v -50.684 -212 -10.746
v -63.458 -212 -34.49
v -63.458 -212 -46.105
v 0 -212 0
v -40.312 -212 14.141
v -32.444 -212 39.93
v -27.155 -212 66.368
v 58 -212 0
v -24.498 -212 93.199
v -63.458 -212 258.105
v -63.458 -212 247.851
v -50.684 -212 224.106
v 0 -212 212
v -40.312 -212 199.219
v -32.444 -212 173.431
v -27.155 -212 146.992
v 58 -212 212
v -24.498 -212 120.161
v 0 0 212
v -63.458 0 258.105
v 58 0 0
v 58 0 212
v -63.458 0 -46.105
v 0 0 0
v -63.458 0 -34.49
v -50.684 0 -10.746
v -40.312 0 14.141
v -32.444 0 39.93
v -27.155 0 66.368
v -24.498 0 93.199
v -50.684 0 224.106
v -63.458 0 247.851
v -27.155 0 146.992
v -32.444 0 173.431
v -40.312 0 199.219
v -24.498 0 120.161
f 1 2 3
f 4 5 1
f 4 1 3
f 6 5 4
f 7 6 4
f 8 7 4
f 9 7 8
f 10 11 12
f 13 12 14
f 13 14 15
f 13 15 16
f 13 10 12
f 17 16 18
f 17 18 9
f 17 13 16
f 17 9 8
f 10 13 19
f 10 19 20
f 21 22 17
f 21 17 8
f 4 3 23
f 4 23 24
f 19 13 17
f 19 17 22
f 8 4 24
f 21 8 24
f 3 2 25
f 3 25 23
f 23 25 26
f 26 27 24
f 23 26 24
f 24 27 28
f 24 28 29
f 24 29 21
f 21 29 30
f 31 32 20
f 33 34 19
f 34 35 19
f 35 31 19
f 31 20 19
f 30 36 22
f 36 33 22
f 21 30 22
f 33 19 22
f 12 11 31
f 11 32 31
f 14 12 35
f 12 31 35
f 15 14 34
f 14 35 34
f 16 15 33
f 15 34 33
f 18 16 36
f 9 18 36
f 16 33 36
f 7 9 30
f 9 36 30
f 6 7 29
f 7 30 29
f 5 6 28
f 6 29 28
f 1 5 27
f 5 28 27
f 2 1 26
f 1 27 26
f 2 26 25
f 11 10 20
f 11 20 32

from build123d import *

# Parameters (mm, degrees)
SKETCH1_W           = 53
SKETCH1_H           = 53
BOSS_EXTRUDE1_DEPTH = 14.5
BOSS_EXTRUDE2_DEPTH = 53
SKETCH5_R           = 68.311173766
CUT_EXTRUDE1_DEPTH  = 60
SCALE1_SCALE        = 4


with BuildPart() as part:
    # Sketch1 → Boss-Extrude1 (new body)
    with BuildSketch(Plane(origin=(0, 0, 0), x_dir=(0, 0, -1), z_dir=(1, 0, 0))):
        with Locations((-26.5, -26.5)):
            Rectangle(SKETCH1_W, SKETCH1_H)
    extrude(amount=BOSS_EXTRUDE1_DEPTH)

    # Sketch2 → Boss-Extrude2 (add)
    with BuildSketch(Plane.XZ.offset(53)):
        Polygon((0, 53), (-15.864497794, 64.526232333), (-15.864497794, -11.526232333), (0, 0), align=None)
    extrude(amount=-BOSS_EXTRUDE2_DEPTH)

    # Sketch5 → Cut-Extrude1 (cut)
    with BuildSketch(Plane(origin=(0, 0, 0), x_dir=(1, 0, 0), z_dir=(0, 1, 0))):
        with Locations((-74.352498141, -26.670023257)):
            Circle(SKETCH5_R)
    extrude(amount=-CUT_EXTRUDE1_DEPTH, mode=Mode.SUBTRACT)


with BuildPart() as part_1:
    # Scale1: scaled about (0, 0, 0)
    add(part.part.scale(SCALE1_SCALE))


solid = part_1.part
